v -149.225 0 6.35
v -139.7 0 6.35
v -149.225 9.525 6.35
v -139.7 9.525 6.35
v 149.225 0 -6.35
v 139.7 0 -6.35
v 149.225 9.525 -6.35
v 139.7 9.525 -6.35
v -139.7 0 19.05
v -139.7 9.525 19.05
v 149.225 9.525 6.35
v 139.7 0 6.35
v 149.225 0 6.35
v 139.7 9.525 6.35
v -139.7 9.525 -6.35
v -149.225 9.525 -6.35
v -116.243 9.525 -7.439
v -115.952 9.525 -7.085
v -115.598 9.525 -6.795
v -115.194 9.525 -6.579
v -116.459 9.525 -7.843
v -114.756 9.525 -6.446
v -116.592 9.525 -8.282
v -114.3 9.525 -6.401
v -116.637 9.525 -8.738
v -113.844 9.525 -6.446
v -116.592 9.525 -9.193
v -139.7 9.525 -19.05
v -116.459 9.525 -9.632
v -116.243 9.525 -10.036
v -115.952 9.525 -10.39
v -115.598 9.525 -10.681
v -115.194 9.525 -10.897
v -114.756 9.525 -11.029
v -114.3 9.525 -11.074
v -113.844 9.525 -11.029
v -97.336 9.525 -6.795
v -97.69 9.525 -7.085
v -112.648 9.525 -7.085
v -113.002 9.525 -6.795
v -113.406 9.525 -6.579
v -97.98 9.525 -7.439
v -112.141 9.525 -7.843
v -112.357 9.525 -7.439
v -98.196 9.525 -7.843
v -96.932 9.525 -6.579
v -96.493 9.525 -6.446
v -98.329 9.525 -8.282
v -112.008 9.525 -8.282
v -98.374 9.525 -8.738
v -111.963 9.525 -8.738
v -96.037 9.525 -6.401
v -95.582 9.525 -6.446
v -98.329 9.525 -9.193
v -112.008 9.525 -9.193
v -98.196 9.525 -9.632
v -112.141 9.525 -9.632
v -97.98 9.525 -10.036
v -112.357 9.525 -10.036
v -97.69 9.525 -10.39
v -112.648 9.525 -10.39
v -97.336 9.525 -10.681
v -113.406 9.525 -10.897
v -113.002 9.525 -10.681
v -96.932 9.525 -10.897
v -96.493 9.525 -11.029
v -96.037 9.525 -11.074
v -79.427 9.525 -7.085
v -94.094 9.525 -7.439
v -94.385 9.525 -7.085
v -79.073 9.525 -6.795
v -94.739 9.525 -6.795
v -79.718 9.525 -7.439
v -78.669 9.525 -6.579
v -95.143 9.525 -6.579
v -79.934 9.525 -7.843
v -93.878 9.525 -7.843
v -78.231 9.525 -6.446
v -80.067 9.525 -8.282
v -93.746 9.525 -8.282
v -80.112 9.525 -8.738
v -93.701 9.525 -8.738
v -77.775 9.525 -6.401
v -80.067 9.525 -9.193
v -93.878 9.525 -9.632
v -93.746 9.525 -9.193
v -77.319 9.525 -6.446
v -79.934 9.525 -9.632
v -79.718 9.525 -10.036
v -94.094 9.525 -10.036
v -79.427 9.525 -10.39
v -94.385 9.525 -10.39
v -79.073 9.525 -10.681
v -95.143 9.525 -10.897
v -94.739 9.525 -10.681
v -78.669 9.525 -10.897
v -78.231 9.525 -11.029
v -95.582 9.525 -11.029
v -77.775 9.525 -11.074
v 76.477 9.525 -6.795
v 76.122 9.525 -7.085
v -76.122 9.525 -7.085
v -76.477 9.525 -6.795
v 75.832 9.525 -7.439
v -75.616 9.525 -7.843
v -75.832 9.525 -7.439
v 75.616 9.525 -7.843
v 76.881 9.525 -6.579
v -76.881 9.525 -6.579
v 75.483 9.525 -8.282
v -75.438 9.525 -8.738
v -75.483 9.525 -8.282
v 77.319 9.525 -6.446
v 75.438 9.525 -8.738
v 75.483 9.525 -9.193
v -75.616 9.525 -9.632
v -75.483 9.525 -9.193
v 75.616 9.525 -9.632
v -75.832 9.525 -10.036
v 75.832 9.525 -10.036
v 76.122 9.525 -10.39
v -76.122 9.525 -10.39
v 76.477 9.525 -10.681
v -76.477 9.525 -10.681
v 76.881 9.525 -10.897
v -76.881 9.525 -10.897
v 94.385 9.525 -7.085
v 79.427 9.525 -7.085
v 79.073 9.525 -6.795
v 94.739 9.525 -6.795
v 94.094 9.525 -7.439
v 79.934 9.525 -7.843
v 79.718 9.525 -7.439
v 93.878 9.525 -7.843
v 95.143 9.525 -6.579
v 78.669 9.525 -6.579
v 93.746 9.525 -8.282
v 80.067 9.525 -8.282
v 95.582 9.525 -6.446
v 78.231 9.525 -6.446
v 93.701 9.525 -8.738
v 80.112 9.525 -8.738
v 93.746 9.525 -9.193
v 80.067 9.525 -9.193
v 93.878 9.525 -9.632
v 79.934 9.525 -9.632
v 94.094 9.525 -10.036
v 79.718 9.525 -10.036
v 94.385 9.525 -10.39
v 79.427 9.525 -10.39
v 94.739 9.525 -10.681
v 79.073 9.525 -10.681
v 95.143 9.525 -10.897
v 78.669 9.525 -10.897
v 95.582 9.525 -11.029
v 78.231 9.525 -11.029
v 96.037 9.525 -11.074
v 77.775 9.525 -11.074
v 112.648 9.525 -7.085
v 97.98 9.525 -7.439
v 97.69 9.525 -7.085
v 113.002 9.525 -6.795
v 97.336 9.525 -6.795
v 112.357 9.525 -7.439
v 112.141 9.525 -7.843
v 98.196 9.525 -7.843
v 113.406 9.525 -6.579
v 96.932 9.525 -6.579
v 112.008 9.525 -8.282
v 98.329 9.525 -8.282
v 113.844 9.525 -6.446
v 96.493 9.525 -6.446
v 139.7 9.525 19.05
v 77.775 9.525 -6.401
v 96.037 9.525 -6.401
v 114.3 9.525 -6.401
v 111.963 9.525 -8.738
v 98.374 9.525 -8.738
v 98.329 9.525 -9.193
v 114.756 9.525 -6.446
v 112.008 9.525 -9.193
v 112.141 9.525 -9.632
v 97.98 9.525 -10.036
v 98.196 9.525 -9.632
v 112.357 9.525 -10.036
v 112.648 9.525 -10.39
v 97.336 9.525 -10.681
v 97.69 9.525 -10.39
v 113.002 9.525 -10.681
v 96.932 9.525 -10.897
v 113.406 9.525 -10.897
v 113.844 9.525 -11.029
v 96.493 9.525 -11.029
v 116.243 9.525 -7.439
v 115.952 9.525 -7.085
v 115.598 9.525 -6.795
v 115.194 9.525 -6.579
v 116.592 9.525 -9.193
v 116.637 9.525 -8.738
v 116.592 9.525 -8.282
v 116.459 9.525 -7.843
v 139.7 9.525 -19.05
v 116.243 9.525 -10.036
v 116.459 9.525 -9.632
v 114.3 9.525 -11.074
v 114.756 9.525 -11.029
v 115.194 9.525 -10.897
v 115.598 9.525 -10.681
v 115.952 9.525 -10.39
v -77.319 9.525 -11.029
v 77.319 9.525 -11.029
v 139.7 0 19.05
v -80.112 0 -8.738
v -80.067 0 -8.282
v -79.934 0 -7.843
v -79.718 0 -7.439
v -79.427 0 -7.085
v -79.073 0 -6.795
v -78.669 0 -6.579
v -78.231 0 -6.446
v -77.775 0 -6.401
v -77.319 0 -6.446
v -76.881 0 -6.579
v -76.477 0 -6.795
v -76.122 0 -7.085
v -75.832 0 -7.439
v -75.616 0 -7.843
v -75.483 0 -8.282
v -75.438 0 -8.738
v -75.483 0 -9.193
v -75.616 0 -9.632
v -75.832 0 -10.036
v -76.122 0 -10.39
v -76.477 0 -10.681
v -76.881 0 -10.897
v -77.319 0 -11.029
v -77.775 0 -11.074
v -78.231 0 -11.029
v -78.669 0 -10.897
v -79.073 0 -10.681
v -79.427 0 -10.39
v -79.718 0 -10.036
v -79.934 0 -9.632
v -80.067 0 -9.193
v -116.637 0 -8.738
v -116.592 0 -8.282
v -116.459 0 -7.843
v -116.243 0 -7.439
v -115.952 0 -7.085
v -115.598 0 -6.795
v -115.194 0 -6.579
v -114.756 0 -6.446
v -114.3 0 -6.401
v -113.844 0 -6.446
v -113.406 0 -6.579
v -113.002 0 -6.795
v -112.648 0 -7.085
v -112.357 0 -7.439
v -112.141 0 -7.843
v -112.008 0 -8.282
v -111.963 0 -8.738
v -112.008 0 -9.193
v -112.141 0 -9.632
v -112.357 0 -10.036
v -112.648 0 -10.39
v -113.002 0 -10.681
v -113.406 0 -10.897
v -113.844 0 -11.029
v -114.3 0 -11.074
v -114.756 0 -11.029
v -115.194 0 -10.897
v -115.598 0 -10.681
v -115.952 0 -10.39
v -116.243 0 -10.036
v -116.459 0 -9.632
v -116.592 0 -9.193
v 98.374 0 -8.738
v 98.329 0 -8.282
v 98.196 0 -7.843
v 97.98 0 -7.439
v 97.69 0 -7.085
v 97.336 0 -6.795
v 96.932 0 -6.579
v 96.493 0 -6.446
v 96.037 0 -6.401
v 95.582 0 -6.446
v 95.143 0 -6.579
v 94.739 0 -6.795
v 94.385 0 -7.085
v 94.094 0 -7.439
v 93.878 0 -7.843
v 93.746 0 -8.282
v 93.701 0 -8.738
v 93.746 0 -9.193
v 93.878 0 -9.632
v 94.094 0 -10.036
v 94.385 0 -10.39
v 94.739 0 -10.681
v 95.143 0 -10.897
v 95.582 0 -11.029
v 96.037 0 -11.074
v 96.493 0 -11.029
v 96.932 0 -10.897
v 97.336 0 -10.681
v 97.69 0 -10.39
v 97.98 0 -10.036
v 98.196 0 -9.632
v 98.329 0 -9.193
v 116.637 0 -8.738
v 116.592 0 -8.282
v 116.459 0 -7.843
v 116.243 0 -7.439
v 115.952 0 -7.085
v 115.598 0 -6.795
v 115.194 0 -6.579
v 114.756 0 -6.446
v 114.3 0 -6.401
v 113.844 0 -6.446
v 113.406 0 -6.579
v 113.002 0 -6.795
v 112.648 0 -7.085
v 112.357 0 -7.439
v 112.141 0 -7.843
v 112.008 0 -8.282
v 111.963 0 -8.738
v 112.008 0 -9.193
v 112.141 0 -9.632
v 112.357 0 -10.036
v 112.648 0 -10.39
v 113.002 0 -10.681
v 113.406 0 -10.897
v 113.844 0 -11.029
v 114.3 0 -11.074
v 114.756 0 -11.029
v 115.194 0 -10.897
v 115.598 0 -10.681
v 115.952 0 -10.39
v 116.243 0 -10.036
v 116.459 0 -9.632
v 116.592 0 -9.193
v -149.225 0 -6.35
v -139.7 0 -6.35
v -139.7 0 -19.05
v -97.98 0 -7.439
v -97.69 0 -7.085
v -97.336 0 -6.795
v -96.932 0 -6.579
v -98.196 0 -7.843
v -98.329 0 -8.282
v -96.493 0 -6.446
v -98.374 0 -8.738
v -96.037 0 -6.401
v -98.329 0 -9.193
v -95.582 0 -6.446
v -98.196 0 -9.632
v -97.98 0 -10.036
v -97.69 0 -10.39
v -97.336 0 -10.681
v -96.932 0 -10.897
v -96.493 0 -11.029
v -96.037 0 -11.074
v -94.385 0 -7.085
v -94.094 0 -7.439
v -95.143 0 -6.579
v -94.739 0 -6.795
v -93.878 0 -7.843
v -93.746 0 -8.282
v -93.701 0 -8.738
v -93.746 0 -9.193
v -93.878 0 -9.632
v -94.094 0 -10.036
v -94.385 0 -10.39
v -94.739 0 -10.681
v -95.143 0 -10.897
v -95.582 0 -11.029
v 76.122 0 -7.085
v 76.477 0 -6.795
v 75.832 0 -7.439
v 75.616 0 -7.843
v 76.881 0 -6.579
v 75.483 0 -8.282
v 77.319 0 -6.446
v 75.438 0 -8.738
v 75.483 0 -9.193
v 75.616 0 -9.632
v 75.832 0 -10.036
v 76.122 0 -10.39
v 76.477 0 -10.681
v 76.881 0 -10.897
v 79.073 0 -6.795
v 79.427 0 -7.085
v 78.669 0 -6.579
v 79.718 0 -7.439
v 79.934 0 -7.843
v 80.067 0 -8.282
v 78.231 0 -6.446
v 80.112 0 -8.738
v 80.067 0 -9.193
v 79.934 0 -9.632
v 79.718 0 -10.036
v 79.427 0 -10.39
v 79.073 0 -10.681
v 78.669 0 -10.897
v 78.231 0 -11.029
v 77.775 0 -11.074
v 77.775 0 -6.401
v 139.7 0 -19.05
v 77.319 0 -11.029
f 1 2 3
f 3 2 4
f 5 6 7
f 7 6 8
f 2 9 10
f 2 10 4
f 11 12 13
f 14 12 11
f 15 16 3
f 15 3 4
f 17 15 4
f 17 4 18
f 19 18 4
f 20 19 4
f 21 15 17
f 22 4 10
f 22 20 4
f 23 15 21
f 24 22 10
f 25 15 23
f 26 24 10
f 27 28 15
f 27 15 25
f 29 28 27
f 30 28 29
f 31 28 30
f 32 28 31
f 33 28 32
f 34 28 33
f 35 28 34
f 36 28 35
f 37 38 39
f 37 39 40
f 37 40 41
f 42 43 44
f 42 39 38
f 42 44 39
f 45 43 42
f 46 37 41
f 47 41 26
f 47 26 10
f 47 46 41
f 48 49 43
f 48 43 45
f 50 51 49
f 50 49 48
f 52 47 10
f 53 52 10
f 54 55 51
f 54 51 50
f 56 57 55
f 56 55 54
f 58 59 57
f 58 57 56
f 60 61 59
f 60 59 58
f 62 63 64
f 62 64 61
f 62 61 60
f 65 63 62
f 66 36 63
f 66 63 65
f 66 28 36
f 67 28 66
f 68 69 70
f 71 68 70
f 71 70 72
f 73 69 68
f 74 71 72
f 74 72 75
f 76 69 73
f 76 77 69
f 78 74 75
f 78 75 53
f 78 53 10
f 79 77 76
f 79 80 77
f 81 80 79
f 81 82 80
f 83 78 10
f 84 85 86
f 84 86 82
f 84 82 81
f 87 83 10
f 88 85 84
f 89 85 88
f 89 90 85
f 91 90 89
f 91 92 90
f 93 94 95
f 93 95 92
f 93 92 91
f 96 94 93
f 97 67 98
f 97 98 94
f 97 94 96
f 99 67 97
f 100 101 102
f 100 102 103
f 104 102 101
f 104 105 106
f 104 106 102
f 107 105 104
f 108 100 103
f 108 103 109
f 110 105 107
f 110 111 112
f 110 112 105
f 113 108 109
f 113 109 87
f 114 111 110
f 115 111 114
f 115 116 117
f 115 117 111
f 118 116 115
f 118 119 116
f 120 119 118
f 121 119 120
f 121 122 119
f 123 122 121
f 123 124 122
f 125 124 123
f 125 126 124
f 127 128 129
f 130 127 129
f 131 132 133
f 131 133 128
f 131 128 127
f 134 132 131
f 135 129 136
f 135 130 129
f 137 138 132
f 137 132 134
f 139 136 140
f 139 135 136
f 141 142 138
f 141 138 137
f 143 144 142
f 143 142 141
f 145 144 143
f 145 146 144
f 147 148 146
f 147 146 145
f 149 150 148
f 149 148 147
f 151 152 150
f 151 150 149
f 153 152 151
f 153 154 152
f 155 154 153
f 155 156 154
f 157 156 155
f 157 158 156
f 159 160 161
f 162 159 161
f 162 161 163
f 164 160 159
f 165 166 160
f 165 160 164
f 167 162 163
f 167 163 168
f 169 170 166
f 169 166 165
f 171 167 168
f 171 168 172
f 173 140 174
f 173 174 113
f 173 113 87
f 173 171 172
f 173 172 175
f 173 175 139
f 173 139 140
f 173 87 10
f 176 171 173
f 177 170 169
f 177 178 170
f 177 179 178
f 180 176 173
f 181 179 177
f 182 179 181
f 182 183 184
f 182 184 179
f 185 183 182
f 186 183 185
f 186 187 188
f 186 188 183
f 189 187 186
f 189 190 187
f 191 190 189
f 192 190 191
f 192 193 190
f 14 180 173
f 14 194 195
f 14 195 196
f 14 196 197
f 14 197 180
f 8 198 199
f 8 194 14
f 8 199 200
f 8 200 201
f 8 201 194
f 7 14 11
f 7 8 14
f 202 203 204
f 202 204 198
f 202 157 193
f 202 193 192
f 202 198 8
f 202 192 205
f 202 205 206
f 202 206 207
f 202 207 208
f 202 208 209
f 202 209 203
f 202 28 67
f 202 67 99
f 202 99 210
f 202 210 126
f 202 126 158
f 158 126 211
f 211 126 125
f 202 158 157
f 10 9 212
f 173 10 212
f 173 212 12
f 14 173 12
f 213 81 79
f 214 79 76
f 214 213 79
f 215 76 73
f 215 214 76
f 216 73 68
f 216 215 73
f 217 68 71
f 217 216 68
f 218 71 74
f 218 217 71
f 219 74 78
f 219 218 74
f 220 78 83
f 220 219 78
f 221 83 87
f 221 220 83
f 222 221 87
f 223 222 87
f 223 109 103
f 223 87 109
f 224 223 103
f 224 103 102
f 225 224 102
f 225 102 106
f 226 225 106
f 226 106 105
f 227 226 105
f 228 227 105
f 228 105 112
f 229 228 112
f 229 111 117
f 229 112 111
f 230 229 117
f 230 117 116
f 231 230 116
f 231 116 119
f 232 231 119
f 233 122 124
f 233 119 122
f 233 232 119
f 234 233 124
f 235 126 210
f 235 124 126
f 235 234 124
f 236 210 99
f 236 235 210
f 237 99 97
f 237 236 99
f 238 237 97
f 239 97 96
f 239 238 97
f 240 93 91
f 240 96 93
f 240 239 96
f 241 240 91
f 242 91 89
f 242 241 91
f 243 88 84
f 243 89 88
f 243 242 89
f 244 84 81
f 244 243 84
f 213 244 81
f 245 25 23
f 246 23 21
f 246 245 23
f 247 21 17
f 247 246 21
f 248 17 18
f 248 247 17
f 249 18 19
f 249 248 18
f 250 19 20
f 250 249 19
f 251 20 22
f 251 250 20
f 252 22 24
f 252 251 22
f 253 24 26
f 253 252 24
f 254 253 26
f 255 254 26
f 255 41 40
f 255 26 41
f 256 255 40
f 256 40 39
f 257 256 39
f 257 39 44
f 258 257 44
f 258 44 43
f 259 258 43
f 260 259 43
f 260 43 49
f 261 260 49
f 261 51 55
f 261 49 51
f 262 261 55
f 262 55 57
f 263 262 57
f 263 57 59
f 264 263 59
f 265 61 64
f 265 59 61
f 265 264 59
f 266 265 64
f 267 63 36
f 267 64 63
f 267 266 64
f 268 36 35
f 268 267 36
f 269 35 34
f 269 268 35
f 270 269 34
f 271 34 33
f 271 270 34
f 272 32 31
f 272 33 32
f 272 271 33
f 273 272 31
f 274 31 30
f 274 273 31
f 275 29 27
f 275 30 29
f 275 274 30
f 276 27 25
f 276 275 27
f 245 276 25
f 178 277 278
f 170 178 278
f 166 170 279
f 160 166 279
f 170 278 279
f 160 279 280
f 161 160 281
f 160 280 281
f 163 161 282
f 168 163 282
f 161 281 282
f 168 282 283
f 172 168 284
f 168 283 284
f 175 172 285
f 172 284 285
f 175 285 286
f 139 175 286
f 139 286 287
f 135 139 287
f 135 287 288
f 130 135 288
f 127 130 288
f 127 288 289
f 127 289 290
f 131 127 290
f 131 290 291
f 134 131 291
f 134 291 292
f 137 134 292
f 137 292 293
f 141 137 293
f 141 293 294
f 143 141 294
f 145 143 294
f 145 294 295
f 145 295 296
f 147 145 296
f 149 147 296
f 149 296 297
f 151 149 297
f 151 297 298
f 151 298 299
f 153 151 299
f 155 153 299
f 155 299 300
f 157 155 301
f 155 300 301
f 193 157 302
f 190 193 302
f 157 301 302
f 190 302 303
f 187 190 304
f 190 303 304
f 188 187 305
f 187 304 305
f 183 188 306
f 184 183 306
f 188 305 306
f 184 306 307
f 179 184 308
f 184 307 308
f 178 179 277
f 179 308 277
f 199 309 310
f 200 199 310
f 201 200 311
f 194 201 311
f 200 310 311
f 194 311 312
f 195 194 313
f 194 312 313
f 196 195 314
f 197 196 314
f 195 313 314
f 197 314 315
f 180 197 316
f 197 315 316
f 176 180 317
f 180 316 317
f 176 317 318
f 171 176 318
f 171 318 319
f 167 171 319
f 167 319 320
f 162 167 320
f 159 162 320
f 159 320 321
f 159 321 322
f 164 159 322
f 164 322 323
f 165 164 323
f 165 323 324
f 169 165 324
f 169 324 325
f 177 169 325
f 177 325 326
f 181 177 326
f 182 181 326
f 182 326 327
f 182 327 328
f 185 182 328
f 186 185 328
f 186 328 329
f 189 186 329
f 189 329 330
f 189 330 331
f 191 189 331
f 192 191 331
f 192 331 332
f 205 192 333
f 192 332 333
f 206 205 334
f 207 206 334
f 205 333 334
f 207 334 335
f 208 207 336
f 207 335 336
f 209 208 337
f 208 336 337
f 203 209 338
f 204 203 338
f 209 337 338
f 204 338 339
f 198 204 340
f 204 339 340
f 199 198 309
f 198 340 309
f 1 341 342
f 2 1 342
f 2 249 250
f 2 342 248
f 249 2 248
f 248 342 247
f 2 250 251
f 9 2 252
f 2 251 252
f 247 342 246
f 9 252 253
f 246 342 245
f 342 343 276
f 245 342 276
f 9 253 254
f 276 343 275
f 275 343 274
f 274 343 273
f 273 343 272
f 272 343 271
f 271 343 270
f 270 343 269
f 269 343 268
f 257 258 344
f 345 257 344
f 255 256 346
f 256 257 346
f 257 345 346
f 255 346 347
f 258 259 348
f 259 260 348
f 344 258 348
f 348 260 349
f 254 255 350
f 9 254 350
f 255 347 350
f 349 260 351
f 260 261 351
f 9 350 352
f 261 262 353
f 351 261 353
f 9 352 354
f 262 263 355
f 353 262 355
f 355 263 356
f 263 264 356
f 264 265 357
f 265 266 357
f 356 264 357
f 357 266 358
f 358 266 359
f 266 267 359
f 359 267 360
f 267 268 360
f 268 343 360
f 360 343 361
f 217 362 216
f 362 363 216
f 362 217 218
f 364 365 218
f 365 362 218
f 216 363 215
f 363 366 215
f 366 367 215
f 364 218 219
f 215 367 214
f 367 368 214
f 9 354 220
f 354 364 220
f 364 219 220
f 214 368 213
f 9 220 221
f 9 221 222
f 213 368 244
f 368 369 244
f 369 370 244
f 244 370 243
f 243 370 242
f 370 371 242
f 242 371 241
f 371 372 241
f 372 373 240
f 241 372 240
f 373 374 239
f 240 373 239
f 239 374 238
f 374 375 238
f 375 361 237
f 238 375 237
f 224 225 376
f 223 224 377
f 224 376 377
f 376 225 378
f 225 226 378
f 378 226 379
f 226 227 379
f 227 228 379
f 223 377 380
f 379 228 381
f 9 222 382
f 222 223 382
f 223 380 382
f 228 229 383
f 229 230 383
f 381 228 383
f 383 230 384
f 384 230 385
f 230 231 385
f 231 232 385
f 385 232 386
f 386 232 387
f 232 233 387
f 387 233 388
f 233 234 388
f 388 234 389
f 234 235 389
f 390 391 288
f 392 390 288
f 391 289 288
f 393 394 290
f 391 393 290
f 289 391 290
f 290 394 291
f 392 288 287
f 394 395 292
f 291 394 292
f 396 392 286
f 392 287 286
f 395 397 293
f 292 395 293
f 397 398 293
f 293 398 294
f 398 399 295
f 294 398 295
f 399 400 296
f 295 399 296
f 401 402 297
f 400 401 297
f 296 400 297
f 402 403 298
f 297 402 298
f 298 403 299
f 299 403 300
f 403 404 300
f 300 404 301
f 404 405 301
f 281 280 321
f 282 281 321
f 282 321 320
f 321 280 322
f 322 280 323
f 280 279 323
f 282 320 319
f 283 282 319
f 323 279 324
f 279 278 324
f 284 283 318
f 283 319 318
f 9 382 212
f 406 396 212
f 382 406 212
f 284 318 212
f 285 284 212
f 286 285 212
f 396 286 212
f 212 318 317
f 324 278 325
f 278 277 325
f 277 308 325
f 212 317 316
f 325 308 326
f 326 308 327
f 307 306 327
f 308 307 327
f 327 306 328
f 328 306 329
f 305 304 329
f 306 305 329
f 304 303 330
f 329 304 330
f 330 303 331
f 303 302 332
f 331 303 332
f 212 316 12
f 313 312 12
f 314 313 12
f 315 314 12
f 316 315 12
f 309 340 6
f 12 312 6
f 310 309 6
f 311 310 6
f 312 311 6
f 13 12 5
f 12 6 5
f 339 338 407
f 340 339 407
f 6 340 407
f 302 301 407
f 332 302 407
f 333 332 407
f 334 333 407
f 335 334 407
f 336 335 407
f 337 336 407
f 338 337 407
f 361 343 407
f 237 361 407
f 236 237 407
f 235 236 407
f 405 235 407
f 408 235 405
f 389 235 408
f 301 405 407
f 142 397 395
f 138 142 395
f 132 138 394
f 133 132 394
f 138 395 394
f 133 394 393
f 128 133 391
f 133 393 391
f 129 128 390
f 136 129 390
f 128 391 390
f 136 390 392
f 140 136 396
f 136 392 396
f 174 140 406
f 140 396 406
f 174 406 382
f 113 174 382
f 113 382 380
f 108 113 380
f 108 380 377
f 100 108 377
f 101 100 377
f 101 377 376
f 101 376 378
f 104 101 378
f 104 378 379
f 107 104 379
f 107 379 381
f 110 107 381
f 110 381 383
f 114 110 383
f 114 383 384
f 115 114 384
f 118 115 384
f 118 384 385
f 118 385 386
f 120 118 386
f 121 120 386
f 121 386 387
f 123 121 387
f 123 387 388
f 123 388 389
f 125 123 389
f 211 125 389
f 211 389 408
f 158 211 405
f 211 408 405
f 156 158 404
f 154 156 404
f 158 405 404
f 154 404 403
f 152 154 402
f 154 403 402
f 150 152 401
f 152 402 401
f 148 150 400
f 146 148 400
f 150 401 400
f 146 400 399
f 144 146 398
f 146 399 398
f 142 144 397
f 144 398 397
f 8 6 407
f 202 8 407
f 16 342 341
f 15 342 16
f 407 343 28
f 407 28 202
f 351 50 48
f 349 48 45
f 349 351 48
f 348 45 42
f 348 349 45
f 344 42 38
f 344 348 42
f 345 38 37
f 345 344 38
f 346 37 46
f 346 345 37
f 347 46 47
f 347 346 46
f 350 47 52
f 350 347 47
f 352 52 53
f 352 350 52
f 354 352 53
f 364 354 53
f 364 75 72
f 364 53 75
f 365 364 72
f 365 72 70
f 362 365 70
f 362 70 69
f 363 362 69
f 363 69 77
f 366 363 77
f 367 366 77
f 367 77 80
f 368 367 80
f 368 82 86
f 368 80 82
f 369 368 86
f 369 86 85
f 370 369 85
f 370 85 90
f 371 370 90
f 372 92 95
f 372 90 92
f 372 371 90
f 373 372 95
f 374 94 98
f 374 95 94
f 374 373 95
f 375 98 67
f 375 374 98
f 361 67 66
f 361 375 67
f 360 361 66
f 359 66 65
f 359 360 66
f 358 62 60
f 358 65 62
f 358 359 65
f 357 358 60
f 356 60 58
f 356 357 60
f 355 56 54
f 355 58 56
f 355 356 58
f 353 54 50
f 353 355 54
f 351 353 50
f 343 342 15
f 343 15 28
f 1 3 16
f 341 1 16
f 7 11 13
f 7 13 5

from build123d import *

# Parameters (mm, degrees)
SKETCH1_W           = 279.4
SKETCH1_H           = 38.1
BOSS_EXTRUDE1_DEPTH = 9.525
SKETCH2_W           = 12.7
SKETCH2_H           = 9.525
BOSS_EXTRUDE2_DEPTH = 9.525
SKETCH3_R           = 2.3368
CUT_EXTRUDE1_DEPTH  = 10.525


with BuildPart() as part:
    # Sketch1 → Boss-Extrude1 (new body)
    with BuildSketch(Plane(origin=(0, 0, 0), x_dir=(1, 0, 0), z_dir=(0, 1, 0))):
        Rectangle(SKETCH1_W, SKETCH1_H)
    extrude(amount=BOSS_EXTRUDE1_DEPTH)

    # Sketch2 → Boss-Extrude2 (add)
    with BuildSketch(Plane(origin=(139.7, 0, 0), x_dir=(0, 0, -1), z_dir=(1, 0, 0))):
        with Locations((0, 4.7625)):
            Rectangle(SKETCH2_W, SKETCH2_H)
    boss_extrude2 = extrude(amount=BOSS_EXTRUDE2_DEPTH)

    # Mirror1: Boss-Extrude2 across plane
    add(boss_extrude2.mirror(Plane(origin=(0, 0, 0), x_dir=(0, 0, 1), z_dir=(1, 0, 0))))

    # Sketch3 → Cut-Extrude1 (cut, through all)
    with BuildSketch(Plane.XZ):
        with Locations((114.3, -8.7376)):
            Circle(SKETCH3_R)
        with Locations((77.7748, -8.7376)):
            Circle(SKETCH3_R)
        with Locations((96.0374, -8.7376)):
            Circle(SKETCH3_R)
    cut_extrude1 = extrude(amount=-CUT_EXTRUDE1_DEPTH, mode=Mode.SUBTRACT)

    # Mirror2: Cut-Extrude1 across plane
    add(cut_extrude1.mirror(Plane(origin=(0, 0, 0), x_dir=(0, 0, 1), z_dir=(1, 0, 0))), mode=Mode.SUBTRACT)


solid = part.part
